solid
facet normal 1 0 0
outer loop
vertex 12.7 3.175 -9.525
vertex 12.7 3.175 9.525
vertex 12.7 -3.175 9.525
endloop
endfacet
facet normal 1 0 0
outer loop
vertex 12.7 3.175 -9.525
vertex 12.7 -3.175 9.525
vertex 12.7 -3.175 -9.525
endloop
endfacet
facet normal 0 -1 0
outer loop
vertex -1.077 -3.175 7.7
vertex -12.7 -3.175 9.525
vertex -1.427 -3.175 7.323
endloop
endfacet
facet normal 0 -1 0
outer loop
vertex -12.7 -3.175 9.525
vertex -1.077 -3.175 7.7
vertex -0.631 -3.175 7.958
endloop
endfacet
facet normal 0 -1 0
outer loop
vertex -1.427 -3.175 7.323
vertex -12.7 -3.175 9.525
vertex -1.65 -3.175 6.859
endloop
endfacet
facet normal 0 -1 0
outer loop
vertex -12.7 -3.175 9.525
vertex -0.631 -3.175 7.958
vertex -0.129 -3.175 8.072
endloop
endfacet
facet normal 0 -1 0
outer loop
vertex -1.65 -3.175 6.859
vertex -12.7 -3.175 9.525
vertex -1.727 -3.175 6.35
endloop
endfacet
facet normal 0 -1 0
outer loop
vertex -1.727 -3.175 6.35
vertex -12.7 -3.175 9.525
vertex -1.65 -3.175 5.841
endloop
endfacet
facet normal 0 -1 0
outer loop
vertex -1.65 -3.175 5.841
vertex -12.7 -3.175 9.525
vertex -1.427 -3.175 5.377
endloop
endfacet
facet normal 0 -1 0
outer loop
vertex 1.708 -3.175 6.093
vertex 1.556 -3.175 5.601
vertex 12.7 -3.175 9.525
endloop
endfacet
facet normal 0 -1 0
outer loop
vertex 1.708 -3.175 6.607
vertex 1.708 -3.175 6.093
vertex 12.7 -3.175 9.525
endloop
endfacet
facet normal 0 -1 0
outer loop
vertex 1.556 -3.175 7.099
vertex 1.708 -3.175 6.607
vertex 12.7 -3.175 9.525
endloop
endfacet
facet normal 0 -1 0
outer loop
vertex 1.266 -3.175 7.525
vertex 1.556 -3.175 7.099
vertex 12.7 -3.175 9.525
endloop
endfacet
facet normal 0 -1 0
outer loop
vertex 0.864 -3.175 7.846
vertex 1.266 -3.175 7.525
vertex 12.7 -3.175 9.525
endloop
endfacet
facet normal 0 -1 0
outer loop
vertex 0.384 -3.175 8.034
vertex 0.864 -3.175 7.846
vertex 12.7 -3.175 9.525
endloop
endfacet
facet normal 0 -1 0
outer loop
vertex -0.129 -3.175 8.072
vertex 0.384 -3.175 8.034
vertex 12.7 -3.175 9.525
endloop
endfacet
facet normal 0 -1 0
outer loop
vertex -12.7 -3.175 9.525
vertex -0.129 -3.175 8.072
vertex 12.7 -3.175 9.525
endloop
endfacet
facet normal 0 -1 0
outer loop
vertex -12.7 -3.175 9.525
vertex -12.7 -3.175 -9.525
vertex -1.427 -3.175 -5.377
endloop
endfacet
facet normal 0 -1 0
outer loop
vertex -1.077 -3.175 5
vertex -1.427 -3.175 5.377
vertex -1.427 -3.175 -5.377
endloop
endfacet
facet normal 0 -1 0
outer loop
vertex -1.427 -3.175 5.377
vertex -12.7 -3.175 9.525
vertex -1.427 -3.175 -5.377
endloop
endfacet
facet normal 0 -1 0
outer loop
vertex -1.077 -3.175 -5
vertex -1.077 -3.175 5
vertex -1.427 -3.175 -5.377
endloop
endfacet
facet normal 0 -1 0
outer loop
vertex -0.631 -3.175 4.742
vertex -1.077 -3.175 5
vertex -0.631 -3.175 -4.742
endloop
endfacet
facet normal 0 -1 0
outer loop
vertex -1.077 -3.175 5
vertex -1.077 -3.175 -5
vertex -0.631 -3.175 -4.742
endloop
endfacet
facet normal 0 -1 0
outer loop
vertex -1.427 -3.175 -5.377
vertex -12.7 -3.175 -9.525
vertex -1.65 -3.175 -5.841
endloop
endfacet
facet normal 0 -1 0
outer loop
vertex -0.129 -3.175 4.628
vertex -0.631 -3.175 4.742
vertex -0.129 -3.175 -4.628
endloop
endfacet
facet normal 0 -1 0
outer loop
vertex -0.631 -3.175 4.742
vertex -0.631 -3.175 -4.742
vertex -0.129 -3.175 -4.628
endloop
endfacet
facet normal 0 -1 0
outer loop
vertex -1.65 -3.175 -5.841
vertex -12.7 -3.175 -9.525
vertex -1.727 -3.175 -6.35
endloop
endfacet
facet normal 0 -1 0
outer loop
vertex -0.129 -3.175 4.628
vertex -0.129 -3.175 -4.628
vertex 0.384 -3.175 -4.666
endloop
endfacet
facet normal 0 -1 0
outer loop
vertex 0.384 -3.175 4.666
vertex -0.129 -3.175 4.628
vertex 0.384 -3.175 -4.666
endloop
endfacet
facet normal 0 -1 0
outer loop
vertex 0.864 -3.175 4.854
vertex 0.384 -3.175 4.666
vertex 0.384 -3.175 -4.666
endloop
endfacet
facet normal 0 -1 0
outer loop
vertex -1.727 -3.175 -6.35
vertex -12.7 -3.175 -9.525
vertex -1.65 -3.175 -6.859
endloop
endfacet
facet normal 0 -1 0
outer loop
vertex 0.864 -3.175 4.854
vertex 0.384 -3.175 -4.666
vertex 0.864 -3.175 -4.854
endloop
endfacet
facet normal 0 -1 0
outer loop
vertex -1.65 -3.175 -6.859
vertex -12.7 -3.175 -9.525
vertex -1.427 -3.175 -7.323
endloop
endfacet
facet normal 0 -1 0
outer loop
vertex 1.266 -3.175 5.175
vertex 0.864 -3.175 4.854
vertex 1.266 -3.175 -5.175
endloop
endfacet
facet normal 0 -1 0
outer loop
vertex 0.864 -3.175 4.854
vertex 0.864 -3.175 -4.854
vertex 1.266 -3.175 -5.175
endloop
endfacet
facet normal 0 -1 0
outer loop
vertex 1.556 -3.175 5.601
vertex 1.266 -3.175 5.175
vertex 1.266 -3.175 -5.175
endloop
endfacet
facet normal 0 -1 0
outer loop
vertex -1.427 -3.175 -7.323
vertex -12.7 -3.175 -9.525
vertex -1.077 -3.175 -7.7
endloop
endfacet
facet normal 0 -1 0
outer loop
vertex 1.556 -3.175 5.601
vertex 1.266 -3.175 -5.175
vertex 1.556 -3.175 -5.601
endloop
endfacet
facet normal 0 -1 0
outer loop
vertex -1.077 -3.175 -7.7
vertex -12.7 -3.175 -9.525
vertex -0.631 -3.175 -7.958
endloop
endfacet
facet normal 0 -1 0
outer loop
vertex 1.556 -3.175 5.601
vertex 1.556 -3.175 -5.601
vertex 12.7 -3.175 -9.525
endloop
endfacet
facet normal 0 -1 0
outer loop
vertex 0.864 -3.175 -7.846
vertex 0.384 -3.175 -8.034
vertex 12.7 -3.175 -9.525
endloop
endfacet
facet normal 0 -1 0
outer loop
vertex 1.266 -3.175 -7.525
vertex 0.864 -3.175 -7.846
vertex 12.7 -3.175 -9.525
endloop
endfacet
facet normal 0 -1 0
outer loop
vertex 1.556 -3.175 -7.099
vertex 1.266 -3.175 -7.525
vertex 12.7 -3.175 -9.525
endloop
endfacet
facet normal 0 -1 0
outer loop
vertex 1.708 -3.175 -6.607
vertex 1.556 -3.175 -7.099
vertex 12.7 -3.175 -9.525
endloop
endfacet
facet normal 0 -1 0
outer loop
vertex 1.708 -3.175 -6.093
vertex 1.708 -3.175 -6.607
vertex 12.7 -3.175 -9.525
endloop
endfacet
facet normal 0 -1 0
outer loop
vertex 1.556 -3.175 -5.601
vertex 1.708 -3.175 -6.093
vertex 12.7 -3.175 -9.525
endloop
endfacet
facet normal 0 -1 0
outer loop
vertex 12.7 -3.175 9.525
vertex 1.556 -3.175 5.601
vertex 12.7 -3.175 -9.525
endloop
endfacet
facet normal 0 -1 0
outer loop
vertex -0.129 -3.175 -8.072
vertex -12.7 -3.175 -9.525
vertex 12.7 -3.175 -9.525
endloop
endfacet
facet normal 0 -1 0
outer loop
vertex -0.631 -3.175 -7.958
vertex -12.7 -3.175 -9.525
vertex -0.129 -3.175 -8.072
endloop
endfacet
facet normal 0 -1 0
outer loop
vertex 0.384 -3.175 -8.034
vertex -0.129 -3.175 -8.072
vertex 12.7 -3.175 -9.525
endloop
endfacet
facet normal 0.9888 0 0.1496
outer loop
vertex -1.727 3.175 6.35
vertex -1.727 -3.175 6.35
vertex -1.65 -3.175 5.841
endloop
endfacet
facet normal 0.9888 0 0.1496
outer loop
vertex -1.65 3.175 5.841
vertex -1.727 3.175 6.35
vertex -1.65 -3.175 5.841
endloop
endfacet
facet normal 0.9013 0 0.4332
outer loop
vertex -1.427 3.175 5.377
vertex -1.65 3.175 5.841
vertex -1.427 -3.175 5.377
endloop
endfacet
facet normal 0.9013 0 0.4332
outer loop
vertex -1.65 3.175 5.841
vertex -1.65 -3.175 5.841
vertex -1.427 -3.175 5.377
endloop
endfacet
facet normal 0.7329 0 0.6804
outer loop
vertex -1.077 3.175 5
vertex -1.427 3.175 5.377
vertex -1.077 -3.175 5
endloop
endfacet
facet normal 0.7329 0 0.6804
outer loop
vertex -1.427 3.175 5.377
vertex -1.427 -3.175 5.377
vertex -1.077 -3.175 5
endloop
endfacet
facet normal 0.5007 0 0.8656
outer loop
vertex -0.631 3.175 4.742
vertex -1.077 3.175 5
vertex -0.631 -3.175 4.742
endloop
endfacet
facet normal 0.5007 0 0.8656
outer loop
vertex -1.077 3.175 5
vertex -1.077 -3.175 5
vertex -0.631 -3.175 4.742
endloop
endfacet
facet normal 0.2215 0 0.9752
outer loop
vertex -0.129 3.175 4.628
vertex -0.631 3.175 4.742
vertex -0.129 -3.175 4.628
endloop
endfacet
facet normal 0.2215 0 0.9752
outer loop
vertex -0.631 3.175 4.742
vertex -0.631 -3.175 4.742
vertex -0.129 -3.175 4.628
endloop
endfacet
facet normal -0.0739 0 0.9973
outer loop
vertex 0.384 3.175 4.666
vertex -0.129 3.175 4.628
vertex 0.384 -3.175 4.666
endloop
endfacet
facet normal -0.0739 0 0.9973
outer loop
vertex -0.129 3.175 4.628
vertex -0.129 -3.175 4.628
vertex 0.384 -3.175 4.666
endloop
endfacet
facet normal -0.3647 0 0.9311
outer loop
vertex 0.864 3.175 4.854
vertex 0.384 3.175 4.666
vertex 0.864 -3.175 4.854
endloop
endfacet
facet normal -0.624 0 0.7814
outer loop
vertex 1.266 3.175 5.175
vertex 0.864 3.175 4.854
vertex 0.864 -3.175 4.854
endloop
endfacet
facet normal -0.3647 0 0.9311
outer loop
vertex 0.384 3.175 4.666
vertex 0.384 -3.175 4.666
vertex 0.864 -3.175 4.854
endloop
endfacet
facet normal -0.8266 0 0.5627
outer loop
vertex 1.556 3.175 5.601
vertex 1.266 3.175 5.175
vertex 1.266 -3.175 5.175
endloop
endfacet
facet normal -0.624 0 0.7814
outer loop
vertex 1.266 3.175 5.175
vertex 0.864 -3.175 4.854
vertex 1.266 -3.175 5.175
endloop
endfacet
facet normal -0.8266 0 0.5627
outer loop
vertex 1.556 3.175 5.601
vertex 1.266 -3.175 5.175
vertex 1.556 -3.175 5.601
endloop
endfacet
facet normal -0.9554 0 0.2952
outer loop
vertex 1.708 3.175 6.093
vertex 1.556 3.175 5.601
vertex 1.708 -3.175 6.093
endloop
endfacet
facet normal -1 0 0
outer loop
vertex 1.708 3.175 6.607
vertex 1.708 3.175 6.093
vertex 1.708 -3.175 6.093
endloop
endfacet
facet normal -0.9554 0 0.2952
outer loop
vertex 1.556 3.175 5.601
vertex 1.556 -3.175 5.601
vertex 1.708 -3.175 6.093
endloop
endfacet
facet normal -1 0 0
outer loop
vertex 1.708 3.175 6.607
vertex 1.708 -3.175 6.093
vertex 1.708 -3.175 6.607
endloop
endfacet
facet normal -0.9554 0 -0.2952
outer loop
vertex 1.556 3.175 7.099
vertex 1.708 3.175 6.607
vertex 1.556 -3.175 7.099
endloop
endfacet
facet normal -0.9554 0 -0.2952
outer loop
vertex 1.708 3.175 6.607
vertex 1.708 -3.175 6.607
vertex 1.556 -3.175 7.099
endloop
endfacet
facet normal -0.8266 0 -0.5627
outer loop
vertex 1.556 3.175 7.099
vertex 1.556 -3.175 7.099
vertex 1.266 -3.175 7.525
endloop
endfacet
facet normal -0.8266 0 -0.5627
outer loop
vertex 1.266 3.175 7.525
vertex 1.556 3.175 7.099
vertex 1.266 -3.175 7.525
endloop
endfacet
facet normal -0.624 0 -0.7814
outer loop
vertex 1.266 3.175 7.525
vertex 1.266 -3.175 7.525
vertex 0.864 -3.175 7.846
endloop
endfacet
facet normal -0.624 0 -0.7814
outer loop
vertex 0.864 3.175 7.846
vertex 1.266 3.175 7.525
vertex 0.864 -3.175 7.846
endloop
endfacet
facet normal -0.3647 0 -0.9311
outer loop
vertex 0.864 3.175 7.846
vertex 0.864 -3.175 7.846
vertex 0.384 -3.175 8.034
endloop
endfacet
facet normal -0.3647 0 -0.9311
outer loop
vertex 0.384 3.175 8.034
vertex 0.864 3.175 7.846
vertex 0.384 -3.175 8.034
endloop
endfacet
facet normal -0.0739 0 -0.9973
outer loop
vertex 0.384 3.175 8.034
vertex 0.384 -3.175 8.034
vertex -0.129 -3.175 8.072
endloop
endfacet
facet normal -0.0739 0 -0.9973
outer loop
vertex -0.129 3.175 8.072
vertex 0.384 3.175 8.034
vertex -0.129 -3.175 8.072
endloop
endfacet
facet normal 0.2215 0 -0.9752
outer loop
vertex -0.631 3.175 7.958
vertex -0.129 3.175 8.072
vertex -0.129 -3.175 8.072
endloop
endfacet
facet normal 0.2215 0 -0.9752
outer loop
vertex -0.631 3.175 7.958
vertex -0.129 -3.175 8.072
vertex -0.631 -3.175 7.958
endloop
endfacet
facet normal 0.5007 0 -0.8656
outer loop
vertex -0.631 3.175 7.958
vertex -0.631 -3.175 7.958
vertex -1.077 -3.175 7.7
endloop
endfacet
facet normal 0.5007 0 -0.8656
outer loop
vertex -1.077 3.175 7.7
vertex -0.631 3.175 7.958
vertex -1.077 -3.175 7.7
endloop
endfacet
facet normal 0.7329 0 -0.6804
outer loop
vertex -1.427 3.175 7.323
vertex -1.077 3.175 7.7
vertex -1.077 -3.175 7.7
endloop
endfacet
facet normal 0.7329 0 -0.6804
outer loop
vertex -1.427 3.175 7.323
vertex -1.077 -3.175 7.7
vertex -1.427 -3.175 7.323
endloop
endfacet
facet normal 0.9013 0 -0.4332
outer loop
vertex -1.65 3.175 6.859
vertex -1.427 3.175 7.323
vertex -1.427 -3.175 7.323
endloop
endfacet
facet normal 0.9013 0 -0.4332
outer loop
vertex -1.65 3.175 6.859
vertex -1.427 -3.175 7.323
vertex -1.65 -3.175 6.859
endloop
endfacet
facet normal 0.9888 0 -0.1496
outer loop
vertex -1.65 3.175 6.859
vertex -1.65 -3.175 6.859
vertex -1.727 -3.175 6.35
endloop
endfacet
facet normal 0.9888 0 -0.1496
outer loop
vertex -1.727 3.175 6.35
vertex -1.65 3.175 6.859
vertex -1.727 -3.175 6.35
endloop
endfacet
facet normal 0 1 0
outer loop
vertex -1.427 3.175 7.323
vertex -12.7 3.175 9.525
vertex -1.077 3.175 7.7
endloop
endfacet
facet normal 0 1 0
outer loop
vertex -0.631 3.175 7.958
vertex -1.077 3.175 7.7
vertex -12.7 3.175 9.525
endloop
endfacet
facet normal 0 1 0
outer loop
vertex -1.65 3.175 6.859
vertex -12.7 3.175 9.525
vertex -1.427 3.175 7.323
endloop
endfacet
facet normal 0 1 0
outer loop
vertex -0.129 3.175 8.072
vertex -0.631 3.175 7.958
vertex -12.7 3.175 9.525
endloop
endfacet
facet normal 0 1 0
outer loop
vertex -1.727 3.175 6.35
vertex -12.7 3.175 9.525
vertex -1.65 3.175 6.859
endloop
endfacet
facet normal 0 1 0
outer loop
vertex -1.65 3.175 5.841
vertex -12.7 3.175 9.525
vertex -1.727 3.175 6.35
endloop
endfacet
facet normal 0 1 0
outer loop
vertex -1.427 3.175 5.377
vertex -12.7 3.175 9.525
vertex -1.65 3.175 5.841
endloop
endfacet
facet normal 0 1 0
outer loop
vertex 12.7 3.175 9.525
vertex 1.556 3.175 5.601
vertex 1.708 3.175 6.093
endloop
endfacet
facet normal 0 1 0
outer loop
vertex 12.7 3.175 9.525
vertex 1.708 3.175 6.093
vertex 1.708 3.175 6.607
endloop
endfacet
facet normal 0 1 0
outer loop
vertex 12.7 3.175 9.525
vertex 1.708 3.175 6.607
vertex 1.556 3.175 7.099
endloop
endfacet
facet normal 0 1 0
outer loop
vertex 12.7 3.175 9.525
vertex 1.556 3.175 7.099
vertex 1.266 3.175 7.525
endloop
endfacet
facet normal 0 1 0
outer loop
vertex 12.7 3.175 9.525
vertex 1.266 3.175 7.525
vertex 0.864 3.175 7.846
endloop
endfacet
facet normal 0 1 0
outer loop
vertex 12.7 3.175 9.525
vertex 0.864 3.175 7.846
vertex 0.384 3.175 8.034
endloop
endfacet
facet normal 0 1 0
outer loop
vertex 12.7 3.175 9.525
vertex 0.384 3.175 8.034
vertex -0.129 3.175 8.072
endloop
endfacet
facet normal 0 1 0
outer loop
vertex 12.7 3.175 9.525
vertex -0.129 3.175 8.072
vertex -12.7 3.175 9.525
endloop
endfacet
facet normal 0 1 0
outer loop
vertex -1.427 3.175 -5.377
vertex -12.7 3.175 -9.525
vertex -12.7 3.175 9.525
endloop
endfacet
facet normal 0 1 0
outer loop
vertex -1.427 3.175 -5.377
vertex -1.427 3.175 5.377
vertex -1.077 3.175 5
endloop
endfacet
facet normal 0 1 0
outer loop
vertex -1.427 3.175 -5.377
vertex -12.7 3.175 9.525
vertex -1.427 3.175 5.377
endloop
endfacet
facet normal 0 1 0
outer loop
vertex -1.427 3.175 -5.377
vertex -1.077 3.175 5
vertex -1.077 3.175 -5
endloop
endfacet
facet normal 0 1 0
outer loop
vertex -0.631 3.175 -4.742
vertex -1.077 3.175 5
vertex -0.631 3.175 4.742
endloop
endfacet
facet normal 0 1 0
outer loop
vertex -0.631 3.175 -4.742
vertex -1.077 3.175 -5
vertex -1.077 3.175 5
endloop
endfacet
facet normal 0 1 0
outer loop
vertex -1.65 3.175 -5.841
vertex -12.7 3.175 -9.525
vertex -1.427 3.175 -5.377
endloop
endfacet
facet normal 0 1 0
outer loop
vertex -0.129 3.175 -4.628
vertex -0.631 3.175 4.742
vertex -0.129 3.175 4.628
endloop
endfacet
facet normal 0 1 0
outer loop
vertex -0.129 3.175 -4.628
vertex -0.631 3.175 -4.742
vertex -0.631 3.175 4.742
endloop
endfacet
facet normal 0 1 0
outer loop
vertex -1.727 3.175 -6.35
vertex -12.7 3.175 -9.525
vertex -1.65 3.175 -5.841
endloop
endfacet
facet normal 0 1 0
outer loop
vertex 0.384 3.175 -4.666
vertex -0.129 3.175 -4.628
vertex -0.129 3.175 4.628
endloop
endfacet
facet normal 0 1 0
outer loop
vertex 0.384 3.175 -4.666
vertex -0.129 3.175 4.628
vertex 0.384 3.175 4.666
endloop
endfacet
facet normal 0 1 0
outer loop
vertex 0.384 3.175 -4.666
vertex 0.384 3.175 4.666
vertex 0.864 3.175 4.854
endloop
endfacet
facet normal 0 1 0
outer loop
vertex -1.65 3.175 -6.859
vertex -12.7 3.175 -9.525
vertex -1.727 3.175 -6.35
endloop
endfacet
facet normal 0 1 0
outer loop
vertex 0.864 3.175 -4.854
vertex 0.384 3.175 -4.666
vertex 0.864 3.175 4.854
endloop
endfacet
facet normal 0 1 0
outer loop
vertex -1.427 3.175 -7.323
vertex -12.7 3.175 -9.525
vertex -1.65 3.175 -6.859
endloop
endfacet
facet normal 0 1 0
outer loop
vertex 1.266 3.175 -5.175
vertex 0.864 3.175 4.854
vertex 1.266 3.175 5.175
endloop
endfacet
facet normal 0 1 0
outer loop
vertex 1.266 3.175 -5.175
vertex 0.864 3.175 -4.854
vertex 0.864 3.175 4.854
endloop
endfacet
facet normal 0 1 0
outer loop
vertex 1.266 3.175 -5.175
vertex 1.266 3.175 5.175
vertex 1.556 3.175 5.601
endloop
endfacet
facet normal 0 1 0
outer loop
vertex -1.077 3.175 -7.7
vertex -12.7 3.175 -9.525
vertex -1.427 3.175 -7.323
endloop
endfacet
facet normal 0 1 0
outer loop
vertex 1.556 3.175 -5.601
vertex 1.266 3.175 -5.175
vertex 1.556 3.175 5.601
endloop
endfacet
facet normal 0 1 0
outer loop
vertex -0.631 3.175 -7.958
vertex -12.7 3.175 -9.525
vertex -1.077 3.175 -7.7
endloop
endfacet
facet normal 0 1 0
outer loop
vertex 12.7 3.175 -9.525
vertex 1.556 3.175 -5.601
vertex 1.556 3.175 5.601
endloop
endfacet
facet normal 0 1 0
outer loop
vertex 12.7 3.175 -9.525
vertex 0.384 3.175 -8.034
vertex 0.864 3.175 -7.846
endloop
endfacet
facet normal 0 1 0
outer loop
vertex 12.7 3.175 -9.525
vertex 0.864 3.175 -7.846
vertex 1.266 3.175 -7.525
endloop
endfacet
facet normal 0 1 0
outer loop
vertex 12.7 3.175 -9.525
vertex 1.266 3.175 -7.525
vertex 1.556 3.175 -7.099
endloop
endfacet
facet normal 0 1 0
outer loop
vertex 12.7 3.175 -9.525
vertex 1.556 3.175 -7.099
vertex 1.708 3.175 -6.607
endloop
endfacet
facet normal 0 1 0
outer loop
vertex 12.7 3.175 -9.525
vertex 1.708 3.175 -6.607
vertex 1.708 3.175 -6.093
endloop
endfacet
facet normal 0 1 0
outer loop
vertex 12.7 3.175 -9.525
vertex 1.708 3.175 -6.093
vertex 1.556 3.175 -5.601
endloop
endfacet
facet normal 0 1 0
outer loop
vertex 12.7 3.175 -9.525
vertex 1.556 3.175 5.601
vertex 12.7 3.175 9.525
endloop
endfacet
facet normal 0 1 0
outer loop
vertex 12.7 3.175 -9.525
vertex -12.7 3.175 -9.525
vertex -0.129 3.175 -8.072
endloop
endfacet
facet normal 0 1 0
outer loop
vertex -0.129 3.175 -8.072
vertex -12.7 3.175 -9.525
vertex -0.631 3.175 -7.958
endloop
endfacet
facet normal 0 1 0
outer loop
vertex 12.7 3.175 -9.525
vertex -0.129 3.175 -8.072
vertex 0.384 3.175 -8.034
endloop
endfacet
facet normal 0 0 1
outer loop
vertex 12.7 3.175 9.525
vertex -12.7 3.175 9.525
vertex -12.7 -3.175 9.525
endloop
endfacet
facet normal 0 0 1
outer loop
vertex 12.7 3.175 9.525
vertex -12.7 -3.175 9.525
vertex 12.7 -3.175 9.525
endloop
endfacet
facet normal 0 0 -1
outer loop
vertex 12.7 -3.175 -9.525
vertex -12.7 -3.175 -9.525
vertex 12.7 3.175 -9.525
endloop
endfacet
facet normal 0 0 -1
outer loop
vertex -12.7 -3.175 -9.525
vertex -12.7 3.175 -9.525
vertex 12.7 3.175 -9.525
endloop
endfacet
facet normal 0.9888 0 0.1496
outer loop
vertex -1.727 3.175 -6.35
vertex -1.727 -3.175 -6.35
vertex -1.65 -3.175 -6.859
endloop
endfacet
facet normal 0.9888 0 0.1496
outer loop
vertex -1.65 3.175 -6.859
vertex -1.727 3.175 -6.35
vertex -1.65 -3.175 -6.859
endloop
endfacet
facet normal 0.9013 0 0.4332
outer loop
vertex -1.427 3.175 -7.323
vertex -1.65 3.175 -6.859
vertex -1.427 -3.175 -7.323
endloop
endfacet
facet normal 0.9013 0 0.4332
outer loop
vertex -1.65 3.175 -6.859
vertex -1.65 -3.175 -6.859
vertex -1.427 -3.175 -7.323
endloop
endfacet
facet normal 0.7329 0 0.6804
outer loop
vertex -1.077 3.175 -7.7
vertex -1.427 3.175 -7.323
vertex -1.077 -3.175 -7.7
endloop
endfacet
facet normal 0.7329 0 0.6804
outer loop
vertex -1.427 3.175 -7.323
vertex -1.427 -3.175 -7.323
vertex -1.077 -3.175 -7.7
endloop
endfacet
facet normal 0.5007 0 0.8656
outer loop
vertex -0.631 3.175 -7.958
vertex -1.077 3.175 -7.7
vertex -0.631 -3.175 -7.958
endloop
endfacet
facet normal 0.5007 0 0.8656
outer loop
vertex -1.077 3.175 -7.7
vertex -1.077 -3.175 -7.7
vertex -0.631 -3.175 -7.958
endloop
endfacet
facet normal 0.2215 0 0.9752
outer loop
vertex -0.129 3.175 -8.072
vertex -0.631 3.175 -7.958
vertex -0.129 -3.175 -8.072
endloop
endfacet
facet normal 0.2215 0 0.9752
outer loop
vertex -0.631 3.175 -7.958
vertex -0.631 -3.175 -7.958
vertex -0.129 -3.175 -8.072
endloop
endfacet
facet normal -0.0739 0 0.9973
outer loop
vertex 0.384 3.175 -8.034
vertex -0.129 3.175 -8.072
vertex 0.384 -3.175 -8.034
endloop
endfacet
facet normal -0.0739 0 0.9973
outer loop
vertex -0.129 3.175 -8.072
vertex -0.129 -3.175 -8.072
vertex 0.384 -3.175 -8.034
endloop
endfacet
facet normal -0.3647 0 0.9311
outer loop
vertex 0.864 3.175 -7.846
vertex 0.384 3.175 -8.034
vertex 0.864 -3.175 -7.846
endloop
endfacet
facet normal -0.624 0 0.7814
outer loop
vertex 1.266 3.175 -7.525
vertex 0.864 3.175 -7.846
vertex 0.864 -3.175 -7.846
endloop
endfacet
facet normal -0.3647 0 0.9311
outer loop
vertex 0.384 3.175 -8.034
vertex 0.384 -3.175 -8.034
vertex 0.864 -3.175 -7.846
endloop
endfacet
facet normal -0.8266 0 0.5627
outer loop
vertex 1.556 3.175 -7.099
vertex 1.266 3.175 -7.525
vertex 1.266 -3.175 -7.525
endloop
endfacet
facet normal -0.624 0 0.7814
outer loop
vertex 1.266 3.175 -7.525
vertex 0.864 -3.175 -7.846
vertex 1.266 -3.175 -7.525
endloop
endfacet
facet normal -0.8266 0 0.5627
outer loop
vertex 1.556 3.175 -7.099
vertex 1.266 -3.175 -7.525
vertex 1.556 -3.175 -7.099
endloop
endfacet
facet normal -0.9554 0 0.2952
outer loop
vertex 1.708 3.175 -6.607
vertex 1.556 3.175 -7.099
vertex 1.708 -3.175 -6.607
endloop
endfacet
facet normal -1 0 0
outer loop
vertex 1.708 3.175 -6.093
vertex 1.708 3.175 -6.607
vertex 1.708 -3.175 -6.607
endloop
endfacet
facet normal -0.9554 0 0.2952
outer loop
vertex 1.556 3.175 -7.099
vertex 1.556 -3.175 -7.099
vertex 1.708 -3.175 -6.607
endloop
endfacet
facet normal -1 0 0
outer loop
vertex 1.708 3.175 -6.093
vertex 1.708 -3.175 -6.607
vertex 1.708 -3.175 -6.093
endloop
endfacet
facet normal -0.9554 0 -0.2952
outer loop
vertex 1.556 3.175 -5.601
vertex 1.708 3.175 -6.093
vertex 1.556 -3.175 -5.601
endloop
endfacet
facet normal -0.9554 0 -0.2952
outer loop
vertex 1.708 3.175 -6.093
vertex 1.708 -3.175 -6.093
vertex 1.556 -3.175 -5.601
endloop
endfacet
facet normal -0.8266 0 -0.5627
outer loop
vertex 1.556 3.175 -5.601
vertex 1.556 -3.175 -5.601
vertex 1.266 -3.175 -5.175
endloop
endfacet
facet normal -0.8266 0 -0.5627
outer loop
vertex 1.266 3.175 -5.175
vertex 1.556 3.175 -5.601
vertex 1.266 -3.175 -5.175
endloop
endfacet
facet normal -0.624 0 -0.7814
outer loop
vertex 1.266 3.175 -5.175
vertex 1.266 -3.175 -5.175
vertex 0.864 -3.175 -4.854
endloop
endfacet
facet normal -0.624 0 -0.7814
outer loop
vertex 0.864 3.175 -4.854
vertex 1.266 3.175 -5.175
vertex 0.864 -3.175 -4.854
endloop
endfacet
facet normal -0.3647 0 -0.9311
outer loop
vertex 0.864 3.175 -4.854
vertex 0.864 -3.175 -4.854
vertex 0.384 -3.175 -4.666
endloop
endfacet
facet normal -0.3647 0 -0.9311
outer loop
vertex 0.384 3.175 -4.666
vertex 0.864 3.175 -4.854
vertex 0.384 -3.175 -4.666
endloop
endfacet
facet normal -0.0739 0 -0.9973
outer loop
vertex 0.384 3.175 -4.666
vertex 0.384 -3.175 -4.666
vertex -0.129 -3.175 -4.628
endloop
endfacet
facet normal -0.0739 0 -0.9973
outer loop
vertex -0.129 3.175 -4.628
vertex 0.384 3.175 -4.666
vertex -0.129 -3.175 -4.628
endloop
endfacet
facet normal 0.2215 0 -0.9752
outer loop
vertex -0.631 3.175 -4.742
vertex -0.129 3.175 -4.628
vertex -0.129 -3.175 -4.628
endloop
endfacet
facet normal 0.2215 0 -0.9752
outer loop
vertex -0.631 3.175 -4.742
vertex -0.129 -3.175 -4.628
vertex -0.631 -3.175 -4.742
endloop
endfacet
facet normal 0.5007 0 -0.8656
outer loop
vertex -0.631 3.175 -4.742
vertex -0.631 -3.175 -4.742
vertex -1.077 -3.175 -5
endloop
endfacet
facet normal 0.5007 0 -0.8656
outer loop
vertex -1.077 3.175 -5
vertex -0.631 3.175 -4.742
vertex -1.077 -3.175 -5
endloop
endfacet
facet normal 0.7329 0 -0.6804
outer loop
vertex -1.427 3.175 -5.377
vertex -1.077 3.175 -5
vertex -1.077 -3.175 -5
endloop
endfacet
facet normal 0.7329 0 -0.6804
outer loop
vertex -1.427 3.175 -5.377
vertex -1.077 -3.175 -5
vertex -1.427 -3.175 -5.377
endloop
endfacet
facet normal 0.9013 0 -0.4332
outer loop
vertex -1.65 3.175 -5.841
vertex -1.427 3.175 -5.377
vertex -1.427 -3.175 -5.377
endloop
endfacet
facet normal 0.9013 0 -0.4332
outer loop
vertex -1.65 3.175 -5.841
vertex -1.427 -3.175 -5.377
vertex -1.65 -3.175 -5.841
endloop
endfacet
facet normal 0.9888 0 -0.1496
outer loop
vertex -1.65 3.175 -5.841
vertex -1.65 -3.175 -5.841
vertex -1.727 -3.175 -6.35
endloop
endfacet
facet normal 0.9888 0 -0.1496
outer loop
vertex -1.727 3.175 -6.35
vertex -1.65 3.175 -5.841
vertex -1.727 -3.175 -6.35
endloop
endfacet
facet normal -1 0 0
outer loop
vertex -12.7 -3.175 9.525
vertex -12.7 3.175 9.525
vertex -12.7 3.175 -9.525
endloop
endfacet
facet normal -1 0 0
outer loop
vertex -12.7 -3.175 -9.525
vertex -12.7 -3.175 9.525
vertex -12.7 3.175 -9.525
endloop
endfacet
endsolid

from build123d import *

# Parameters (mm, degrees)
SKETCH1_W             = 25.4
SKETCH1_H             = 19.05
BOSS_EXTRUDE1_DEPTH   = 3.175
F_8_32_TAPPED_HOLE1_D = 3.4544


with BuildPart() as part:
    # Sketch1 → Boss-Extrude1 (new, symmetric)
    with BuildSketch(Plane(origin=(0, 0, 0), x_dir=(1, 0, 0), z_dir=(0, 1, 0))):
        Rectangle(SKETCH1_W, SKETCH1_H)
    extrude(amount=BOSS_EXTRUDE1_DEPTH, both=True)

    # #8-32 Tapped Hole1 (through all)
    with Locations(Plane(origin=(0, 3.175, 0), x_dir=(1, 0, 0), z_dir=(0, 1, 0))):
        with Locations((0, 6.35), (0, -6.35)):
            Hole(F_8_32_TAPPED_HOLE1_D / 2)


solid = part.part
